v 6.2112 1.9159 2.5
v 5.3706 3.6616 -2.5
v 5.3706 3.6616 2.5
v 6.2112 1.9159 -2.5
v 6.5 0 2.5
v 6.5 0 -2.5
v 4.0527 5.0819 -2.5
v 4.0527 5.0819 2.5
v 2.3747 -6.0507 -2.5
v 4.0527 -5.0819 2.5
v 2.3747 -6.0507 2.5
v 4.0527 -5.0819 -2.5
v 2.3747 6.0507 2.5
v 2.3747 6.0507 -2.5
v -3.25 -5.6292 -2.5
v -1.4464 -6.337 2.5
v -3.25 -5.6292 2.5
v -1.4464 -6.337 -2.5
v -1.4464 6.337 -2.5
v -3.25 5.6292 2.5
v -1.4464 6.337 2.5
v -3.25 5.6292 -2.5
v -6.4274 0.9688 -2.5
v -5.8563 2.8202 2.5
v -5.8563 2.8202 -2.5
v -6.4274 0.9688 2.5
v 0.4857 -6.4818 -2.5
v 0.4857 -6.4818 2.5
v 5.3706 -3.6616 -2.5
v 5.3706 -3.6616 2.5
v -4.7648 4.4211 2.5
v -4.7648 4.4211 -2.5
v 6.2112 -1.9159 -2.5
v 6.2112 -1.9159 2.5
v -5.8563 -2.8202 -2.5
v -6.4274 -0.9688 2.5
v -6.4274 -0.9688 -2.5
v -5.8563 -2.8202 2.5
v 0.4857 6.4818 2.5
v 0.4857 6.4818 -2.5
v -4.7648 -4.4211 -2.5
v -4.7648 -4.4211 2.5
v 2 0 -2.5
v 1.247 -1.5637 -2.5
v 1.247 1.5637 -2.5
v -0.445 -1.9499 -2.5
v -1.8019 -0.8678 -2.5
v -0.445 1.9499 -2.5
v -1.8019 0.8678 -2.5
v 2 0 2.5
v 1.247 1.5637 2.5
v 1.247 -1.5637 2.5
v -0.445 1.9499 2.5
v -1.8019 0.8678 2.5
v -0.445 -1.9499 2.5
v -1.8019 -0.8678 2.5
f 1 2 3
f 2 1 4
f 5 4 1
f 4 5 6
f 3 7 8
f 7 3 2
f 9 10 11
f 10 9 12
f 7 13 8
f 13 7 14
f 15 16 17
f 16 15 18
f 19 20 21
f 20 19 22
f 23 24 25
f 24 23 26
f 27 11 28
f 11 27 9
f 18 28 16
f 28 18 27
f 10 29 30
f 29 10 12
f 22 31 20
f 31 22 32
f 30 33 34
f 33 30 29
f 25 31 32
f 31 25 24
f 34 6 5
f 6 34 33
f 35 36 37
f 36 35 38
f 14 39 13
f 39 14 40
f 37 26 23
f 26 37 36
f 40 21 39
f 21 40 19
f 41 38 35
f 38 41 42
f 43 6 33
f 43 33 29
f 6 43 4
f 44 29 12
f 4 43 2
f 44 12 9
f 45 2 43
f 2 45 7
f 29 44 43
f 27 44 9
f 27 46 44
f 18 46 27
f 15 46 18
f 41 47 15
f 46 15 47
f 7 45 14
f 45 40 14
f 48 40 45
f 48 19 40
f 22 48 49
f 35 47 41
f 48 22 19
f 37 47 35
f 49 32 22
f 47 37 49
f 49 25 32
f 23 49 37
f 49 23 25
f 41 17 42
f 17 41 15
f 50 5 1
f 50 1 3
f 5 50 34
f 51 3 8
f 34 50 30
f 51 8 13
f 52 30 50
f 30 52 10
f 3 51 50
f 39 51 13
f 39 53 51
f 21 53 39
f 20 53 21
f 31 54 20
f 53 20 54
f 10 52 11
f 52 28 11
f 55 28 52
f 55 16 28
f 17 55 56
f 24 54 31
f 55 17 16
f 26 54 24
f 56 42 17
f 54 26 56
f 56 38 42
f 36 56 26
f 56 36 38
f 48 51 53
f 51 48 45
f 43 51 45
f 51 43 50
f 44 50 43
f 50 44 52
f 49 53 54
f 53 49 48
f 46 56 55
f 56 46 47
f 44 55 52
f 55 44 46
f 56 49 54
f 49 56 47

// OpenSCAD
//This is my attempt to model a bearing.


//Create a bearing by specifying internal diameter, external diameter and width.
module Bearing(int_Diameter,ext_Diameter,width)
	{
	echo("********************************************");
	echo("Creating bearing with following dimensions");
	echo("Internal Diameter: ",int_Diameter);
	echo("External Diameter: ",ext_Diameter);
	echo("Width: ",width);
	echo("********************************************");



	//create external cylinder minus internal cylinder
	difference()
		{
		bearingExternalGeom(ext_Diameter,width);
		cylinder(width,int_Diameter/2,int_Diameter/2,true);
		}
	


//	translate([-side_length/2,-head_size/2,0]) cube([side_length,head_size,head_depth]);
	//rotate([0,0,120]) translate([-side_length/2,-head_size/2,0])cube([side_length,head_size,head_depth]);
	//rotate([0,0,240]) translate([-side_length/2,-head_size/2,0])cube([side_length,head_size,head_depth]);
	
	//Add shaft offset by depth of head
	//shaft_radius=diameter/2;
//	translate([0,0,head_depth]) cylinder(length,shaft_radius,shaft_radius);
	}

//use for getting external geometry only (for binary commands)
module bearingExternalGeom(ext_Diameter,width)
	{
	echo("********************************************");
	echo("Creating bearing (external geometry) with following dimensions");
	echo("External Diameter: ",ext_Diameter);
	echo("Width: ",width);
	echo("********************************************");
	cylinder(width,ext_Diameter/2,ext_Diameter/2,true);
	
	}

//Parameters ***********************************
//Internal diameter
int_Diameter=4;

//External Diameter
ext_Diameter=13;

//width
width=5;

//608=8,22,7
//624=4,13,5
//**********************************************

Bearing(int_Diameter,ext_Diameter,width);
